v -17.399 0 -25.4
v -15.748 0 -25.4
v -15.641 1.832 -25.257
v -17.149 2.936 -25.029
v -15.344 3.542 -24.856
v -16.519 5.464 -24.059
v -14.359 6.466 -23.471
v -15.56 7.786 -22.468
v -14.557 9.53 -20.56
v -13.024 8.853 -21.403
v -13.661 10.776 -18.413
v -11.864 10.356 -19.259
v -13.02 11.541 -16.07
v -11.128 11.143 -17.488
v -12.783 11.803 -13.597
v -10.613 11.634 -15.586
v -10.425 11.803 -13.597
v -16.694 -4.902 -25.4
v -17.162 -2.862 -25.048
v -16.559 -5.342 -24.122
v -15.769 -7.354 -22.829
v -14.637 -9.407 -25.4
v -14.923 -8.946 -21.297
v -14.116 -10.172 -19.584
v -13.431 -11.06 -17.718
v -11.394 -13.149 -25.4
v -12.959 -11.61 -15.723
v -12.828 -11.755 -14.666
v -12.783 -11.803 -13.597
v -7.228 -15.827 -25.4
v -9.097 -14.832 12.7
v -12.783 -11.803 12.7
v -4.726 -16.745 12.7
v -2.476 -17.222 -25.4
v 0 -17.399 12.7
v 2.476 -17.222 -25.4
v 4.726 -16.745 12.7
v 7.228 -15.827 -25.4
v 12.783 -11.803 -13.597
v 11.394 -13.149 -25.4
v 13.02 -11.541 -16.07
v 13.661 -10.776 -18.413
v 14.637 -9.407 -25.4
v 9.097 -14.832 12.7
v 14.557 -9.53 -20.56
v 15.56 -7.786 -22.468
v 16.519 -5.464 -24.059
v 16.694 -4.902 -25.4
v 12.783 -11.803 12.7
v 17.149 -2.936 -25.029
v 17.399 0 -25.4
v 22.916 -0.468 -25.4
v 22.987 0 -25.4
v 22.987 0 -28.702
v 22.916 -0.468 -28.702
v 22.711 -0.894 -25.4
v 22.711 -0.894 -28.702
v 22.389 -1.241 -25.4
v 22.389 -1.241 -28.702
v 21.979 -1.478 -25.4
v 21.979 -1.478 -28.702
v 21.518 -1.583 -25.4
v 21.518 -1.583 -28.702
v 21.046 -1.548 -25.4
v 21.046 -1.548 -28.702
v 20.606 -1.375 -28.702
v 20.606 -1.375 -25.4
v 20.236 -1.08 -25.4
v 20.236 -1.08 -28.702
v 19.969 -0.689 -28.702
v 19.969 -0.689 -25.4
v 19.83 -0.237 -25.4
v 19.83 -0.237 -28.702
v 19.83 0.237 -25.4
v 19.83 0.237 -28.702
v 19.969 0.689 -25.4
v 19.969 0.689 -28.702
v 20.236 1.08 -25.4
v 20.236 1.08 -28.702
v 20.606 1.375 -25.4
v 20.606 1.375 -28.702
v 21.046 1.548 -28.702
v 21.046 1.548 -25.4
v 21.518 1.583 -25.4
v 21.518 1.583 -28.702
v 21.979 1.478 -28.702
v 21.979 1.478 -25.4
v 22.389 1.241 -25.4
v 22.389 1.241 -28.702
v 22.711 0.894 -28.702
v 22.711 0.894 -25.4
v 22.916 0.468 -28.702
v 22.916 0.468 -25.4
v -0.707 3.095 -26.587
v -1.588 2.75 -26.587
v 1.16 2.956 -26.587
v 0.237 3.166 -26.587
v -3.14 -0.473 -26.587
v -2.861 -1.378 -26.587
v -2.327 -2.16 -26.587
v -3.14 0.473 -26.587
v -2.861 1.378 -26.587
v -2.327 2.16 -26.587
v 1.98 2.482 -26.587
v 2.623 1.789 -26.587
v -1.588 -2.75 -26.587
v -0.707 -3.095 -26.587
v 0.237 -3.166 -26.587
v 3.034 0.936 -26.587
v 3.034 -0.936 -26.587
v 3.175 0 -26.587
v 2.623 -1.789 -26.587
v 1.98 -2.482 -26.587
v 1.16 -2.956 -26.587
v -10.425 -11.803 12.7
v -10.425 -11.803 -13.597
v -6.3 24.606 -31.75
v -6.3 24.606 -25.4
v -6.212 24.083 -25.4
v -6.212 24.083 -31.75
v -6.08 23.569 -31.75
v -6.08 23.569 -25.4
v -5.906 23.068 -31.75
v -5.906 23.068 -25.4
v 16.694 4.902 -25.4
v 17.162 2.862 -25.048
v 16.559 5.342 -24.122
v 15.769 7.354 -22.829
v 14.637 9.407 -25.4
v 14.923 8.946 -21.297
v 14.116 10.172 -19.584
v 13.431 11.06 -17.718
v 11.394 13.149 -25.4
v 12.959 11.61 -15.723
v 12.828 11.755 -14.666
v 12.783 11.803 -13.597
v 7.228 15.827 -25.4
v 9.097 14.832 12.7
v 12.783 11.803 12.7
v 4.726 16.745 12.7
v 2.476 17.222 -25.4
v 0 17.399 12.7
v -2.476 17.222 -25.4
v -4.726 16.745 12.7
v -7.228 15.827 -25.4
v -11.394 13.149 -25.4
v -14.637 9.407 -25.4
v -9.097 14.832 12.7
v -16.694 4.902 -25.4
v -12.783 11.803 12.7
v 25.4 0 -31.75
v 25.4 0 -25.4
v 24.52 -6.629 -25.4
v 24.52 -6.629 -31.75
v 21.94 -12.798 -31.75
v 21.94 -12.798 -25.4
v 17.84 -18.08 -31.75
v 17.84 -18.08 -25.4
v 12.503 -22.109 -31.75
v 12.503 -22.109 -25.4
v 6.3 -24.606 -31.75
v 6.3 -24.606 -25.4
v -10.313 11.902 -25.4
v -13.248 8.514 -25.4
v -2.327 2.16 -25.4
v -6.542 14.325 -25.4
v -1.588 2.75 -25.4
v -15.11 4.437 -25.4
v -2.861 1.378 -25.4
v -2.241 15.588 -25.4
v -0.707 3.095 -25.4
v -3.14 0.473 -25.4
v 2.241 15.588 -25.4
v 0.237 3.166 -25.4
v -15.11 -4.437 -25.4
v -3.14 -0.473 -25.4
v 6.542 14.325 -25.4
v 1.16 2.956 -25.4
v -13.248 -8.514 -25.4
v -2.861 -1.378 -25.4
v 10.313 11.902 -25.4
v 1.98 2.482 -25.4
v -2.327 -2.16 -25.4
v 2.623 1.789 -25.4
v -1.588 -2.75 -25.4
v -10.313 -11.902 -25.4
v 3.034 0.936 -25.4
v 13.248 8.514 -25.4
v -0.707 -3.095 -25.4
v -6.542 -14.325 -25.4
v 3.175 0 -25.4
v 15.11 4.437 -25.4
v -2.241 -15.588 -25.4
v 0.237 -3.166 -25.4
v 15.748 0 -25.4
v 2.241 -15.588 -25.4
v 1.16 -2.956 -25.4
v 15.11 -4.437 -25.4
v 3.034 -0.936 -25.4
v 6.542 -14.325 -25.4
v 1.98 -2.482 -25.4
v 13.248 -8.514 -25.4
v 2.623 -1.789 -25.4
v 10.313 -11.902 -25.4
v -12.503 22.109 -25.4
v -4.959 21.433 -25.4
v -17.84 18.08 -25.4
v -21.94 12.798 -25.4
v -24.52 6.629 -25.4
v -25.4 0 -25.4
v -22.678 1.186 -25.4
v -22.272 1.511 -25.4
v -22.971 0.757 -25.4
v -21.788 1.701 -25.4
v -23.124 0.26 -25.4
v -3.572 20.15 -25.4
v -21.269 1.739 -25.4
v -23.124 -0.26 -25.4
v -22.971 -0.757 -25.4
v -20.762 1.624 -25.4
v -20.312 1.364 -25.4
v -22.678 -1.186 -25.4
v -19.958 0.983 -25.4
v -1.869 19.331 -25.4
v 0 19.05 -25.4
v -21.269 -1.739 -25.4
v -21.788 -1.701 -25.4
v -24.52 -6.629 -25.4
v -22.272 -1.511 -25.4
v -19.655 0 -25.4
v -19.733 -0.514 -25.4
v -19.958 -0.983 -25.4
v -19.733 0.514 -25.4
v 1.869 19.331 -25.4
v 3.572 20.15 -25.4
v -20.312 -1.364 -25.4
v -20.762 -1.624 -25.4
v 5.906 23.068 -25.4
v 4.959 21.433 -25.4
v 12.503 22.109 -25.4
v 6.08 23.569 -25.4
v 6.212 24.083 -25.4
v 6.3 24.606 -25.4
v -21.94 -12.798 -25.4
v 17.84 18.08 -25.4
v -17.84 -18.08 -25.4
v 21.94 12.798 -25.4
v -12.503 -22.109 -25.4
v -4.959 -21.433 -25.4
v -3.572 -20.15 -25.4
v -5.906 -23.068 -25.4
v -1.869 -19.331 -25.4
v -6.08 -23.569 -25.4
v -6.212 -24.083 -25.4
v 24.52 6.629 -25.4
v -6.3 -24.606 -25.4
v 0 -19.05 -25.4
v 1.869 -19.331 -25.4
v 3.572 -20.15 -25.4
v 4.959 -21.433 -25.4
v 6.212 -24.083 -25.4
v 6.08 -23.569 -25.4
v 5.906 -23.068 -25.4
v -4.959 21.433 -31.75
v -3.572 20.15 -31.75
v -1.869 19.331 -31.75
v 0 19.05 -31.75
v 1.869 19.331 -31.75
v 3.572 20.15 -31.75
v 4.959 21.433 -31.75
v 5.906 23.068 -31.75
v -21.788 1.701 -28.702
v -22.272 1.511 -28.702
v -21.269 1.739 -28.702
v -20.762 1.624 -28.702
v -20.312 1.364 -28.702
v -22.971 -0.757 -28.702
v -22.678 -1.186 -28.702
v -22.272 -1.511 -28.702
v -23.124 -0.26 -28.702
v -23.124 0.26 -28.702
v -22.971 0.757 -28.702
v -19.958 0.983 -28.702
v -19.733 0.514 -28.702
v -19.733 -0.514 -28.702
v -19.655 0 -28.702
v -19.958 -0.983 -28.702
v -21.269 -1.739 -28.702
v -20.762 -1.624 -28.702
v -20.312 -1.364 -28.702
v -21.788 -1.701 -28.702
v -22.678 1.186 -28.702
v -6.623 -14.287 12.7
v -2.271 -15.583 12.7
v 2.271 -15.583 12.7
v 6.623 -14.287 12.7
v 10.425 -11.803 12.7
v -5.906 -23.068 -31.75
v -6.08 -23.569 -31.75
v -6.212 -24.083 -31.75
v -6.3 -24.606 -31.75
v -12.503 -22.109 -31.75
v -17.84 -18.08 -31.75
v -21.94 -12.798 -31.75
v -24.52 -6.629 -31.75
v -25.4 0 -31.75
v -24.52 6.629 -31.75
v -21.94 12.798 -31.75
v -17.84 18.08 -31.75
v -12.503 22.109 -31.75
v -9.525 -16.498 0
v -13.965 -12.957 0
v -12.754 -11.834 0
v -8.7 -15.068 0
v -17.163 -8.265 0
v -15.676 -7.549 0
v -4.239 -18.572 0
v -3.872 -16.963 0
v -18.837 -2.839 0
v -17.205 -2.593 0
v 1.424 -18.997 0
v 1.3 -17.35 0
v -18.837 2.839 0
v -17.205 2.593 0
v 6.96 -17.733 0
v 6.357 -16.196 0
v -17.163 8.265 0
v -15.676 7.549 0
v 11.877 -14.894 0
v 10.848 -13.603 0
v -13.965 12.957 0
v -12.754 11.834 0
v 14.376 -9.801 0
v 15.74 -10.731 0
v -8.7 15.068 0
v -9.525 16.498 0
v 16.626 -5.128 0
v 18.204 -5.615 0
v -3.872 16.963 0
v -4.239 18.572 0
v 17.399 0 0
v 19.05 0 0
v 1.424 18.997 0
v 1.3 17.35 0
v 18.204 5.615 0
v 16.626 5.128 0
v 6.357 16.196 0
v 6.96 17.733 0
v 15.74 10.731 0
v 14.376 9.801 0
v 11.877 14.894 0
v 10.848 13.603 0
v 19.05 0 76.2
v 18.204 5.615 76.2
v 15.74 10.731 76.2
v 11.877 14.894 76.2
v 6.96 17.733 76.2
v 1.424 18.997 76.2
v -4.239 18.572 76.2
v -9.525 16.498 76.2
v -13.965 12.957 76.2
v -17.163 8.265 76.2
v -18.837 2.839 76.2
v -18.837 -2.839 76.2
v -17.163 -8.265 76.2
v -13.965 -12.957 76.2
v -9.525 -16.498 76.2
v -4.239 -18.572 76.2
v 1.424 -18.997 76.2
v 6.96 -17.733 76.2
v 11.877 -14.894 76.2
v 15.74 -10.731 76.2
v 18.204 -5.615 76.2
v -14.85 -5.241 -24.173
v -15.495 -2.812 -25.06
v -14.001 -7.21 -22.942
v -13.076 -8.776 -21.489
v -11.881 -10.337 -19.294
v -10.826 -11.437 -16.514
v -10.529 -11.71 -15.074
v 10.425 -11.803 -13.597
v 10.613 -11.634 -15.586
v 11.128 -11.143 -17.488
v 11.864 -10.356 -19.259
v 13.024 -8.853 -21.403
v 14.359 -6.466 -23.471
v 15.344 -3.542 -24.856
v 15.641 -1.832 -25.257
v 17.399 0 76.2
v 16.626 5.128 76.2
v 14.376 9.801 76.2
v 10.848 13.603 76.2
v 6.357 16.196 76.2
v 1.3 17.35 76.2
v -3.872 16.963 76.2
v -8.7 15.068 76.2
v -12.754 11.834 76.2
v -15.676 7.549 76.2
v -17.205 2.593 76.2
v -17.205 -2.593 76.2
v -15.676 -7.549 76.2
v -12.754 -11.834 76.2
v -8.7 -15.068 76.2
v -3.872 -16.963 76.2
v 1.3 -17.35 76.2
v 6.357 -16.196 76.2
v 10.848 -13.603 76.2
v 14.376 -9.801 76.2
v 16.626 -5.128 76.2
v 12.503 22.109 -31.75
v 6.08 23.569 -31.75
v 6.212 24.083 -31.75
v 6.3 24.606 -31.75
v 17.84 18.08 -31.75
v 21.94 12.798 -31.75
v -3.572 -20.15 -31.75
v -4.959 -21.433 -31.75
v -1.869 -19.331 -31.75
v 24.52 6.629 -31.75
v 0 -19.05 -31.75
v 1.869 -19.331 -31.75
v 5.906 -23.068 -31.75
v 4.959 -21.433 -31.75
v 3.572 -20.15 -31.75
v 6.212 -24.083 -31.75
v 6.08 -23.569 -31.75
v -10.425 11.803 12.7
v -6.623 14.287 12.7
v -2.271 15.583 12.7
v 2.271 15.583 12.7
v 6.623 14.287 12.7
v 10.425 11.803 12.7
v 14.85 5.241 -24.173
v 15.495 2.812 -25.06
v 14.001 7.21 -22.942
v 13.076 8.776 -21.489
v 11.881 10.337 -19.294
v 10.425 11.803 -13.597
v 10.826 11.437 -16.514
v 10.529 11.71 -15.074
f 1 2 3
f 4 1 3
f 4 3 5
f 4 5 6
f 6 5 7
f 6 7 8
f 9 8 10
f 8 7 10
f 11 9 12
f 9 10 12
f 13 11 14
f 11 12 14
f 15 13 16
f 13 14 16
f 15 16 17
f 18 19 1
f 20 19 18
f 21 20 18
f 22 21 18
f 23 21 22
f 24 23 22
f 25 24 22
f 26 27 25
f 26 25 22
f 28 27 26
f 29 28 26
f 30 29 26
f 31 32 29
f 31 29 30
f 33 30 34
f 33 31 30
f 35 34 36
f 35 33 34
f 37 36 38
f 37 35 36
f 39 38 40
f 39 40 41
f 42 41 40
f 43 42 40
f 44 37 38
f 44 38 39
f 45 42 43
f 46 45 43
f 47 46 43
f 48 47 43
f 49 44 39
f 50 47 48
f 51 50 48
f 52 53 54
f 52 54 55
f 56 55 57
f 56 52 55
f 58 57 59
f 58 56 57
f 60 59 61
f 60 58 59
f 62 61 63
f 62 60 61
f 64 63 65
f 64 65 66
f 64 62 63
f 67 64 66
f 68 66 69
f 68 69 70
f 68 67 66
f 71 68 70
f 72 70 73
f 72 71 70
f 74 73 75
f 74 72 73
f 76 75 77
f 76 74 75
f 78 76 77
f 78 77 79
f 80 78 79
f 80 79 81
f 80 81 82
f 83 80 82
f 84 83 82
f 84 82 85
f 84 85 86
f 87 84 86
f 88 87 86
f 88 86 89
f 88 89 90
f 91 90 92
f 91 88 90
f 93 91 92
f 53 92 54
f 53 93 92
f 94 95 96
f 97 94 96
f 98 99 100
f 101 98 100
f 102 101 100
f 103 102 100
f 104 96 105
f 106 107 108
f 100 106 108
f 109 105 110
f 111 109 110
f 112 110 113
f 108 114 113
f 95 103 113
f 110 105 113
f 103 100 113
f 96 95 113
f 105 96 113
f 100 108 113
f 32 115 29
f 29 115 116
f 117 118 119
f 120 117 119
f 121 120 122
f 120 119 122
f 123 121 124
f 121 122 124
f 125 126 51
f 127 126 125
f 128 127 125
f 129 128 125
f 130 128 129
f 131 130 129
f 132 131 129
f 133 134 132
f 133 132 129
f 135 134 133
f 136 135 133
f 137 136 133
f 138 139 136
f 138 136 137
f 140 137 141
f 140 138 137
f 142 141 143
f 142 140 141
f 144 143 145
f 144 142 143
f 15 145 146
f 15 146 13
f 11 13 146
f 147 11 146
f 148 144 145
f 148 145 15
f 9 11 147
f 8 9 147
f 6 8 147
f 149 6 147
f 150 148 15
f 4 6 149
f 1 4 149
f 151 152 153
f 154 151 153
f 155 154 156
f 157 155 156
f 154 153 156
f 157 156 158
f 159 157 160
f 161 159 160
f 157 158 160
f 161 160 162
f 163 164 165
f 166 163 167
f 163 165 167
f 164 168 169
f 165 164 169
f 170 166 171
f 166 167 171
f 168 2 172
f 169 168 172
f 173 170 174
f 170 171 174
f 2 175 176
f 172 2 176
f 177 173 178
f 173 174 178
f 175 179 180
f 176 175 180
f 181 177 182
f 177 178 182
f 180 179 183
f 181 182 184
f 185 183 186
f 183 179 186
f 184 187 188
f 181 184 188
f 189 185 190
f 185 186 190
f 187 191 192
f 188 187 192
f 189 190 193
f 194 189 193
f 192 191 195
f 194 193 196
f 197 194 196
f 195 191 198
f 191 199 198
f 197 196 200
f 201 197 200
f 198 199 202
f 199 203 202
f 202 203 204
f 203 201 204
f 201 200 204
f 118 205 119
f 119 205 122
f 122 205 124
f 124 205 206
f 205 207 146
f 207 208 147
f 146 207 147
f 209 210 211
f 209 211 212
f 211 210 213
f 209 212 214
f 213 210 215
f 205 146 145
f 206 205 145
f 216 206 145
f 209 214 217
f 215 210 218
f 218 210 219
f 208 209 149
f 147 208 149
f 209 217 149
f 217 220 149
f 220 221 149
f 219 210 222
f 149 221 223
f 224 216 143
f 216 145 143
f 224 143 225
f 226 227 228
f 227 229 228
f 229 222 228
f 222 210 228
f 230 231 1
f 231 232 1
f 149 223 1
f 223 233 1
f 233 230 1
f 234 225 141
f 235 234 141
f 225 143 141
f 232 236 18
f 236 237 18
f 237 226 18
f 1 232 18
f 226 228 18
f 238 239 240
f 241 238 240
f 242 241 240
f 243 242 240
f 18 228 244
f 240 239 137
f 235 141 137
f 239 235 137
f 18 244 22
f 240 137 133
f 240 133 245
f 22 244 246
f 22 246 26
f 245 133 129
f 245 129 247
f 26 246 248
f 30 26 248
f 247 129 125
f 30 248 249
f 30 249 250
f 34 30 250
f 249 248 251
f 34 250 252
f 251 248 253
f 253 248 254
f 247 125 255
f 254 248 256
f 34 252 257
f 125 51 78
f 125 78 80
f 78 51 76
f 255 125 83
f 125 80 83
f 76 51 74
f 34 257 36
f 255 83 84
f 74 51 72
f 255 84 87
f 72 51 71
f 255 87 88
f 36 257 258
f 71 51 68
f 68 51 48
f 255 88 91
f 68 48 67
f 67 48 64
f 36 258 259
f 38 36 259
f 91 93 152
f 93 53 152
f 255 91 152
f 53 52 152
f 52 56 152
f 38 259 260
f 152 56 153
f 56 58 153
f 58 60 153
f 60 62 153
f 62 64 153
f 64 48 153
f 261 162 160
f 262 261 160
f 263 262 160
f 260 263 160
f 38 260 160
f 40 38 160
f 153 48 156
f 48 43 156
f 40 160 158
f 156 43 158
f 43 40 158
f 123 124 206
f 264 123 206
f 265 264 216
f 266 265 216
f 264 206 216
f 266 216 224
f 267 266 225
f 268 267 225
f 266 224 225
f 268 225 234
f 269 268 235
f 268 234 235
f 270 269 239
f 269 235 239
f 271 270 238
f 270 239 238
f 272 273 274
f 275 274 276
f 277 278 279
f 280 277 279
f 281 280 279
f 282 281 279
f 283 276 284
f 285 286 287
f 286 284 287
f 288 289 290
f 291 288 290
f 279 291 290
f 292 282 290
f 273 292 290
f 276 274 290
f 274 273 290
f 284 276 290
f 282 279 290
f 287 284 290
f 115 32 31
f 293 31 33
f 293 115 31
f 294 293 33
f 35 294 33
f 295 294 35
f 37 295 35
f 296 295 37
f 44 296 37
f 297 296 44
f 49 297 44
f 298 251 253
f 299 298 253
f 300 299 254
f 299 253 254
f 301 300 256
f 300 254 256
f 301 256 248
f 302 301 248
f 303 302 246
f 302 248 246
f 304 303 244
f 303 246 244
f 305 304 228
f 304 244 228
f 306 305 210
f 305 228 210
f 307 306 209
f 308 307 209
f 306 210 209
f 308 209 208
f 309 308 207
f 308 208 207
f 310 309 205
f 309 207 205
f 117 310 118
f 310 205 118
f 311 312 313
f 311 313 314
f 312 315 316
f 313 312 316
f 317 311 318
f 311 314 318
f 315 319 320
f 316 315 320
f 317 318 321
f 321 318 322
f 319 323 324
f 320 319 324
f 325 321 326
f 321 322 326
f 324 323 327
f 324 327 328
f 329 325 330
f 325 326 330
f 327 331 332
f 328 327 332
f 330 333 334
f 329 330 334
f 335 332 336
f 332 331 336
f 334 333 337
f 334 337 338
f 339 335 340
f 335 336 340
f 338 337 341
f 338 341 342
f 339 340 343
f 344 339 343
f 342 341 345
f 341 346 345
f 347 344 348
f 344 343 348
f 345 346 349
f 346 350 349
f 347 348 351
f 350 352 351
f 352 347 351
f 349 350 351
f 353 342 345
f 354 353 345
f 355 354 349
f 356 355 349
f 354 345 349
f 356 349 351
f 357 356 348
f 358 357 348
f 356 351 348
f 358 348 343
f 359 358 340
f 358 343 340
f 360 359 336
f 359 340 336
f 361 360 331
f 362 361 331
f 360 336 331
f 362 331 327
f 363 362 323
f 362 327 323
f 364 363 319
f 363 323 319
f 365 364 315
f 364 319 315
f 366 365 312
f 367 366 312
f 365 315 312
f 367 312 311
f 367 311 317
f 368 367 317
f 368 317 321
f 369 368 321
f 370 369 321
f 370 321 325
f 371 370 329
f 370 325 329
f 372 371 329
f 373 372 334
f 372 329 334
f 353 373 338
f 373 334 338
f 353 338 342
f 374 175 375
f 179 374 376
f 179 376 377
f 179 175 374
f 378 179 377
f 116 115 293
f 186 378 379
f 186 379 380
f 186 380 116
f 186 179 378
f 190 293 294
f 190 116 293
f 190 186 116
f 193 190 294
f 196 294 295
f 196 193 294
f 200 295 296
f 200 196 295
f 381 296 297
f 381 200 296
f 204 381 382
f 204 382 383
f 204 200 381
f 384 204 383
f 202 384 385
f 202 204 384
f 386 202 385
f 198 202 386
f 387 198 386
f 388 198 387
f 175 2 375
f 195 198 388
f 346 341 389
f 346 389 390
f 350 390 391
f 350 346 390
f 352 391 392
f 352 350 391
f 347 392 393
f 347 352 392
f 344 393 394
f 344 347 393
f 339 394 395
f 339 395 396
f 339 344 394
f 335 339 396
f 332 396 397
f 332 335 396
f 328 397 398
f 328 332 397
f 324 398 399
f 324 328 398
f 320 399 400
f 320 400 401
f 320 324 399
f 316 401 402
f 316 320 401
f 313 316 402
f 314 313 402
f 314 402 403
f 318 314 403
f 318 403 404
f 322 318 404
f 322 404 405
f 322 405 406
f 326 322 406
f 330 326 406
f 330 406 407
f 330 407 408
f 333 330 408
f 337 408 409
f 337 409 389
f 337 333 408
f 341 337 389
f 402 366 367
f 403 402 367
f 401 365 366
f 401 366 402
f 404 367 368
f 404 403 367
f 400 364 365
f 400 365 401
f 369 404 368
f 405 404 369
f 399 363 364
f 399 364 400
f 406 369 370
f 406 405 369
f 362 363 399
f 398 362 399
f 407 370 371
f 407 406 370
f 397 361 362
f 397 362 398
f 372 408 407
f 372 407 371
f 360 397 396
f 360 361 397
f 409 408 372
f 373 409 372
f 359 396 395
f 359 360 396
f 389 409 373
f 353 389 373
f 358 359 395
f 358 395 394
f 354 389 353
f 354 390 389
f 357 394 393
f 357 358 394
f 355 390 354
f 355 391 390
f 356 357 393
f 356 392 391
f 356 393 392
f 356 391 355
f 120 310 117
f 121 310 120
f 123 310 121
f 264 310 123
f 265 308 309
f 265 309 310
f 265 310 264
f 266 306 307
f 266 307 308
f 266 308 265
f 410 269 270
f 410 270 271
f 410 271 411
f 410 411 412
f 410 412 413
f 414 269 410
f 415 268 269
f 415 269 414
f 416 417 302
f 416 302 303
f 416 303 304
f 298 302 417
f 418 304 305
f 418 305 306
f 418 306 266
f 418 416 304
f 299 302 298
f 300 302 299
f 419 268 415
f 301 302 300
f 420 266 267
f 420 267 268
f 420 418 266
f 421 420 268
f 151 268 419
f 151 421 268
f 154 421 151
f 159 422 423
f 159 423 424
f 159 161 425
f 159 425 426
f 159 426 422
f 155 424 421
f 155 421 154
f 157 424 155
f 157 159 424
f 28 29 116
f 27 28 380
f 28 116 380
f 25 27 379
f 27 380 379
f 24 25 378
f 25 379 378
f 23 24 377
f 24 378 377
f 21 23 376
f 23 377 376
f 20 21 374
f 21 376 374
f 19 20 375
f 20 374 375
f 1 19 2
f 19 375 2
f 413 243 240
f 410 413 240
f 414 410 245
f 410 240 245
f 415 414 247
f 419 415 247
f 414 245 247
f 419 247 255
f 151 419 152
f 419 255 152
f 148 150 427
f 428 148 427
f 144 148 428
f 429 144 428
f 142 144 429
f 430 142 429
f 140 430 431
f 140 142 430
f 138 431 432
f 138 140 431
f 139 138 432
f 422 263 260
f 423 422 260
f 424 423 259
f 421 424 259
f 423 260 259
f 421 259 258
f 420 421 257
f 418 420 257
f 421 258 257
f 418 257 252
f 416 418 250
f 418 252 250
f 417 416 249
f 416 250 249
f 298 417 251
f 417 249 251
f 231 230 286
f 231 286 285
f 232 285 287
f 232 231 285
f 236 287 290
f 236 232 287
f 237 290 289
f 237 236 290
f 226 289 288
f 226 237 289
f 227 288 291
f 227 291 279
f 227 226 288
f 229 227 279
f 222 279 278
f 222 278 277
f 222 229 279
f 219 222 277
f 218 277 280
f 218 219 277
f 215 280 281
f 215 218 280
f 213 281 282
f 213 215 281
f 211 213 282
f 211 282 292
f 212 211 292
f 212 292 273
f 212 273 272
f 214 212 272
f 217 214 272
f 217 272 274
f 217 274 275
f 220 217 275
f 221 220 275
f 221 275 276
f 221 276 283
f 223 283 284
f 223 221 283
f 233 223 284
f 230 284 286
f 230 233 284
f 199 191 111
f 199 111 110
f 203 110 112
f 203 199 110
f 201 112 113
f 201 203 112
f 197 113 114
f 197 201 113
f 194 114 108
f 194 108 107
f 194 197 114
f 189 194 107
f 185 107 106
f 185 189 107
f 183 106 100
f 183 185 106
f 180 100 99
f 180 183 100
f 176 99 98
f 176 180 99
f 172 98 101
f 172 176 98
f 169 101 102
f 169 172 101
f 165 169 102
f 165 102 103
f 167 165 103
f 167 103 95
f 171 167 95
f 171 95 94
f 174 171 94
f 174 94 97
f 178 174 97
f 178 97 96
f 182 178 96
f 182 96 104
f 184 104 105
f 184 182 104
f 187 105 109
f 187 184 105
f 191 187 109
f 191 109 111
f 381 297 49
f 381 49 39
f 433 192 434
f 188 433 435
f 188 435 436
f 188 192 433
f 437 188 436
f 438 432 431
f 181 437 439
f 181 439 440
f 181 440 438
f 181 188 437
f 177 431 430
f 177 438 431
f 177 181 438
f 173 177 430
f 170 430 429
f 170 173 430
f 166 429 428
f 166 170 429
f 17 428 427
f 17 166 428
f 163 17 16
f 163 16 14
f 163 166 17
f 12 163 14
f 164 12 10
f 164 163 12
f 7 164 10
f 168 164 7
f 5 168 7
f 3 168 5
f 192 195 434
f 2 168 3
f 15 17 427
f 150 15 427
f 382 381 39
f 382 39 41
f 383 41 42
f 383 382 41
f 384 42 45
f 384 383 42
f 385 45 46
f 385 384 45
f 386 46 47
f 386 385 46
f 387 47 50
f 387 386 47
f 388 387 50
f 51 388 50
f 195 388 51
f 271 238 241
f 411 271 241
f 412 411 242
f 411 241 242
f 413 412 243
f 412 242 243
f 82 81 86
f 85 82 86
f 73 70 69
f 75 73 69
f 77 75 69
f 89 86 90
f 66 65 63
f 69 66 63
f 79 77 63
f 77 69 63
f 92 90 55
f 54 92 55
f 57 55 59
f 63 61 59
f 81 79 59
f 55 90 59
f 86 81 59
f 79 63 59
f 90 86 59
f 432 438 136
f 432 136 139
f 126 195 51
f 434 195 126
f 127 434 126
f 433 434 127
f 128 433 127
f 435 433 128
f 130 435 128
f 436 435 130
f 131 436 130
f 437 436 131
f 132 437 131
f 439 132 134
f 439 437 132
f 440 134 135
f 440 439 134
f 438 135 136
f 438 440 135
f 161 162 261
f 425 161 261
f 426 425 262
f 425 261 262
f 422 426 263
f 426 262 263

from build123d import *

# Parameters (mm, degrees)
F0_R          = 19.05
F0_R_2        = 17.399
F1_DEPTH      = 76.2
F2_R          = 17.399
F2_R_2        = 15.748
F3_DEPTH      = 25.4
F3_DEPTH_BACK = 12.7
F4_R          = 1.7442879666
F4_R_2        = 17.399
F4_R_3        = 1.5875
F4_R_4        = 15.748
F4_R_5        = 3.175
F5_DEPTH      = 6.35
F7_DEPTH      = 25.401
F7_DEPTH_BACK = 25.401
F8_DEPTH      = 3.302
F9_DEPTH      = 1.18745


with BuildPart() as f1:
    # F0 (on Top) → F1 (new body)
    with BuildSketch(Plane.XY):
        Circle(F0_R)
        Circle(F0_R_2, mode=Mode.SUBTRACT)
    extrude(amount=F1_DEPTH)


with BuildPart() as f3:
    # F2 (on Top) → F3 (new body, two sides)
    with BuildSketch(Plane.XY) as f3_sk:
        Circle(F2_R)
        Circle(F2_R_2, mode=Mode.SUBTRACT)
    extrude(amount=-F3_DEPTH)
    extrude(f3_sk.sketch, amount=F3_DEPTH_BACK)

    # F4 (on face) → F5 (join)
    with BuildSketch(Plane(origin=(0, 0, -25.4), x_dir=(1, 0, 0), z_dir=(0, 0, -1))):
        with BuildLine():
            ThreePointArc((23.8125, 0), (18.8106631264, 14.6011680696), (5.9064331026, 23.068359375))
            ThreePointArc((5.9064331026, 23.068359375), (0, 19.05), (-5.9064331026, 23.068359375))
            ThreePointArc((-5.9064331026, 23.068359375), (-23.8125, 0), (-5.9064331026, -23.068359375))
            ThreePointArc((-5.9064331026, -23.068359375), (0, -19.05), (5.9064331026, -23.068359375))
            ThreePointArc((5.9064331026, -23.068359375), (18.8106631264, -14.6011680696), (23.8125, 0))
        make_face()
        with Locations((-21.3995, 0)):
            Circle(F4_R, mode=Mode.SUBTRACT)
        Circle(F4_R_2, mode=Mode.SUBTRACT)
        with Locations((21.3995, 0)):
            Circle(F4_R_3, mode=Mode.SUBTRACT)
        Circle(F4_R_2)
        Circle(F4_R_4, mode=Mode.SUBTRACT)
        Circle(F4_R_4)
        Circle(F4_R_5, mode=Mode.SUBTRACT)
        with BuildLine():
            ThreePointArc((-5.9064331026, 23.068359375), (-6.1515625, 23.8249511726), (-6.3001953095, 24.60625))
            ThreePointArc((-6.3001953095, 24.60625), (-25.4, 0), (-6.3001953095, -24.60625))
            ThreePointArc((-6.3001953095, -24.60625), (-6.1515625, -23.8249511726), (-5.9064331026, -23.068359375))
            ThreePointArc((-5.9064331026, -23.068359375), (-23.8125, 0), (-5.9064331026, 23.068359375))
        make_face()
        with BuildLine():
            ThreePointArc((6.3001953095, -24.60625), (20.0647073348, -15.5745792742), (25.4, 0))
            ThreePointArc((25.4, 0), (20.0647073348, 15.5745792742), (6.3001953095, 24.60625))
            ThreePointArc((6.3001953095, 24.60625), (6.1515625, 23.8249511726), (5.9064331026, 23.068359375))
            ThreePointArc((5.9064331026, 23.068359375), (18.8106631264, 14.6011680696), (23.8125, 0))
            ThreePointArc((23.8125, 0), (18.8106631264, -14.6011680696), (5.9064331026, -23.068359375))
            ThreePointArc((5.9064331026, -23.068359375), (6.1515625, -23.8249511726), (6.3001953095, -24.60625))
        make_face()
        Circle(F4_R_5)
        with Locations((-21.3995, 0)):
            Circle(F4_R)
        with Locations((21.3995, 0)):
            Circle(F4_R_3)
    extrude(amount=F5_DEPTH)

    # F6 (on Right) → F7 (cut, two sides)
    with BuildSketch(Plane.YZ) as f7_sk:
        with BuildLine():
            ThreePointArc((2.9e-08, -25.4), (8.3460186097, -21.9429658941), (11.8030526951, -13.5969473049))
            ThreePointArc((11.8030526951, -13.5969473049), (0, -1.7938946098), (-11.8030526951, -13.5969473049))
            ThreePointArc((-11.8030526951, -13.5969473049), (-8.3460185892, -21.9429659146), (2.9e-08, -25.4))
        make_face()
        with BuildLine():
            ThreePointArc((-11.8030526951, -13.5969473049), (0, -1.7938946098), (11.8030526951, -13.5969473049))
            Line((11.8030526951, -13.5969473049), (11.8030526951, 28.5120714845))
            Line((11.8030526951, 28.5120714845), (-11.8030526951, 28.5120714845))
            Line((-11.8030526951, 28.5120714845), (-11.8030526951, -13.5969473049))
        make_face()
    extrude(amount=F7_DEPTH, mode=Mode.SUBTRACT)
    extrude(f7_sk.sketch, amount=-F7_DEPTH_BACK, mode=Mode.SUBTRACT)

    # F4 (on face) → F8 (cut)
    with BuildSketch(Plane(origin=(0, 0, -25.4), x_dir=(1, 0, 0), z_dir=(0, 0, -1))):
        with Locations((21.3995, 0)):
            Circle(F4_R_3)
        with Locations((-21.3995, 0)):
            Circle(F4_R)
    extrude(amount=F8_DEPTH, mode=Mode.SUBTRACT)

    # F4 (on face) → F9 (cut)
    with BuildSketch(Plane(origin=(0, 0, -25.4), x_dir=(1, 0, 0), z_dir=(0, 0, -1))):
        Circle(F4_R_5)
    extrude(amount=F9_DEPTH, mode=Mode.SUBTRACT)


solid = Compound([f1.part, f3.part])
